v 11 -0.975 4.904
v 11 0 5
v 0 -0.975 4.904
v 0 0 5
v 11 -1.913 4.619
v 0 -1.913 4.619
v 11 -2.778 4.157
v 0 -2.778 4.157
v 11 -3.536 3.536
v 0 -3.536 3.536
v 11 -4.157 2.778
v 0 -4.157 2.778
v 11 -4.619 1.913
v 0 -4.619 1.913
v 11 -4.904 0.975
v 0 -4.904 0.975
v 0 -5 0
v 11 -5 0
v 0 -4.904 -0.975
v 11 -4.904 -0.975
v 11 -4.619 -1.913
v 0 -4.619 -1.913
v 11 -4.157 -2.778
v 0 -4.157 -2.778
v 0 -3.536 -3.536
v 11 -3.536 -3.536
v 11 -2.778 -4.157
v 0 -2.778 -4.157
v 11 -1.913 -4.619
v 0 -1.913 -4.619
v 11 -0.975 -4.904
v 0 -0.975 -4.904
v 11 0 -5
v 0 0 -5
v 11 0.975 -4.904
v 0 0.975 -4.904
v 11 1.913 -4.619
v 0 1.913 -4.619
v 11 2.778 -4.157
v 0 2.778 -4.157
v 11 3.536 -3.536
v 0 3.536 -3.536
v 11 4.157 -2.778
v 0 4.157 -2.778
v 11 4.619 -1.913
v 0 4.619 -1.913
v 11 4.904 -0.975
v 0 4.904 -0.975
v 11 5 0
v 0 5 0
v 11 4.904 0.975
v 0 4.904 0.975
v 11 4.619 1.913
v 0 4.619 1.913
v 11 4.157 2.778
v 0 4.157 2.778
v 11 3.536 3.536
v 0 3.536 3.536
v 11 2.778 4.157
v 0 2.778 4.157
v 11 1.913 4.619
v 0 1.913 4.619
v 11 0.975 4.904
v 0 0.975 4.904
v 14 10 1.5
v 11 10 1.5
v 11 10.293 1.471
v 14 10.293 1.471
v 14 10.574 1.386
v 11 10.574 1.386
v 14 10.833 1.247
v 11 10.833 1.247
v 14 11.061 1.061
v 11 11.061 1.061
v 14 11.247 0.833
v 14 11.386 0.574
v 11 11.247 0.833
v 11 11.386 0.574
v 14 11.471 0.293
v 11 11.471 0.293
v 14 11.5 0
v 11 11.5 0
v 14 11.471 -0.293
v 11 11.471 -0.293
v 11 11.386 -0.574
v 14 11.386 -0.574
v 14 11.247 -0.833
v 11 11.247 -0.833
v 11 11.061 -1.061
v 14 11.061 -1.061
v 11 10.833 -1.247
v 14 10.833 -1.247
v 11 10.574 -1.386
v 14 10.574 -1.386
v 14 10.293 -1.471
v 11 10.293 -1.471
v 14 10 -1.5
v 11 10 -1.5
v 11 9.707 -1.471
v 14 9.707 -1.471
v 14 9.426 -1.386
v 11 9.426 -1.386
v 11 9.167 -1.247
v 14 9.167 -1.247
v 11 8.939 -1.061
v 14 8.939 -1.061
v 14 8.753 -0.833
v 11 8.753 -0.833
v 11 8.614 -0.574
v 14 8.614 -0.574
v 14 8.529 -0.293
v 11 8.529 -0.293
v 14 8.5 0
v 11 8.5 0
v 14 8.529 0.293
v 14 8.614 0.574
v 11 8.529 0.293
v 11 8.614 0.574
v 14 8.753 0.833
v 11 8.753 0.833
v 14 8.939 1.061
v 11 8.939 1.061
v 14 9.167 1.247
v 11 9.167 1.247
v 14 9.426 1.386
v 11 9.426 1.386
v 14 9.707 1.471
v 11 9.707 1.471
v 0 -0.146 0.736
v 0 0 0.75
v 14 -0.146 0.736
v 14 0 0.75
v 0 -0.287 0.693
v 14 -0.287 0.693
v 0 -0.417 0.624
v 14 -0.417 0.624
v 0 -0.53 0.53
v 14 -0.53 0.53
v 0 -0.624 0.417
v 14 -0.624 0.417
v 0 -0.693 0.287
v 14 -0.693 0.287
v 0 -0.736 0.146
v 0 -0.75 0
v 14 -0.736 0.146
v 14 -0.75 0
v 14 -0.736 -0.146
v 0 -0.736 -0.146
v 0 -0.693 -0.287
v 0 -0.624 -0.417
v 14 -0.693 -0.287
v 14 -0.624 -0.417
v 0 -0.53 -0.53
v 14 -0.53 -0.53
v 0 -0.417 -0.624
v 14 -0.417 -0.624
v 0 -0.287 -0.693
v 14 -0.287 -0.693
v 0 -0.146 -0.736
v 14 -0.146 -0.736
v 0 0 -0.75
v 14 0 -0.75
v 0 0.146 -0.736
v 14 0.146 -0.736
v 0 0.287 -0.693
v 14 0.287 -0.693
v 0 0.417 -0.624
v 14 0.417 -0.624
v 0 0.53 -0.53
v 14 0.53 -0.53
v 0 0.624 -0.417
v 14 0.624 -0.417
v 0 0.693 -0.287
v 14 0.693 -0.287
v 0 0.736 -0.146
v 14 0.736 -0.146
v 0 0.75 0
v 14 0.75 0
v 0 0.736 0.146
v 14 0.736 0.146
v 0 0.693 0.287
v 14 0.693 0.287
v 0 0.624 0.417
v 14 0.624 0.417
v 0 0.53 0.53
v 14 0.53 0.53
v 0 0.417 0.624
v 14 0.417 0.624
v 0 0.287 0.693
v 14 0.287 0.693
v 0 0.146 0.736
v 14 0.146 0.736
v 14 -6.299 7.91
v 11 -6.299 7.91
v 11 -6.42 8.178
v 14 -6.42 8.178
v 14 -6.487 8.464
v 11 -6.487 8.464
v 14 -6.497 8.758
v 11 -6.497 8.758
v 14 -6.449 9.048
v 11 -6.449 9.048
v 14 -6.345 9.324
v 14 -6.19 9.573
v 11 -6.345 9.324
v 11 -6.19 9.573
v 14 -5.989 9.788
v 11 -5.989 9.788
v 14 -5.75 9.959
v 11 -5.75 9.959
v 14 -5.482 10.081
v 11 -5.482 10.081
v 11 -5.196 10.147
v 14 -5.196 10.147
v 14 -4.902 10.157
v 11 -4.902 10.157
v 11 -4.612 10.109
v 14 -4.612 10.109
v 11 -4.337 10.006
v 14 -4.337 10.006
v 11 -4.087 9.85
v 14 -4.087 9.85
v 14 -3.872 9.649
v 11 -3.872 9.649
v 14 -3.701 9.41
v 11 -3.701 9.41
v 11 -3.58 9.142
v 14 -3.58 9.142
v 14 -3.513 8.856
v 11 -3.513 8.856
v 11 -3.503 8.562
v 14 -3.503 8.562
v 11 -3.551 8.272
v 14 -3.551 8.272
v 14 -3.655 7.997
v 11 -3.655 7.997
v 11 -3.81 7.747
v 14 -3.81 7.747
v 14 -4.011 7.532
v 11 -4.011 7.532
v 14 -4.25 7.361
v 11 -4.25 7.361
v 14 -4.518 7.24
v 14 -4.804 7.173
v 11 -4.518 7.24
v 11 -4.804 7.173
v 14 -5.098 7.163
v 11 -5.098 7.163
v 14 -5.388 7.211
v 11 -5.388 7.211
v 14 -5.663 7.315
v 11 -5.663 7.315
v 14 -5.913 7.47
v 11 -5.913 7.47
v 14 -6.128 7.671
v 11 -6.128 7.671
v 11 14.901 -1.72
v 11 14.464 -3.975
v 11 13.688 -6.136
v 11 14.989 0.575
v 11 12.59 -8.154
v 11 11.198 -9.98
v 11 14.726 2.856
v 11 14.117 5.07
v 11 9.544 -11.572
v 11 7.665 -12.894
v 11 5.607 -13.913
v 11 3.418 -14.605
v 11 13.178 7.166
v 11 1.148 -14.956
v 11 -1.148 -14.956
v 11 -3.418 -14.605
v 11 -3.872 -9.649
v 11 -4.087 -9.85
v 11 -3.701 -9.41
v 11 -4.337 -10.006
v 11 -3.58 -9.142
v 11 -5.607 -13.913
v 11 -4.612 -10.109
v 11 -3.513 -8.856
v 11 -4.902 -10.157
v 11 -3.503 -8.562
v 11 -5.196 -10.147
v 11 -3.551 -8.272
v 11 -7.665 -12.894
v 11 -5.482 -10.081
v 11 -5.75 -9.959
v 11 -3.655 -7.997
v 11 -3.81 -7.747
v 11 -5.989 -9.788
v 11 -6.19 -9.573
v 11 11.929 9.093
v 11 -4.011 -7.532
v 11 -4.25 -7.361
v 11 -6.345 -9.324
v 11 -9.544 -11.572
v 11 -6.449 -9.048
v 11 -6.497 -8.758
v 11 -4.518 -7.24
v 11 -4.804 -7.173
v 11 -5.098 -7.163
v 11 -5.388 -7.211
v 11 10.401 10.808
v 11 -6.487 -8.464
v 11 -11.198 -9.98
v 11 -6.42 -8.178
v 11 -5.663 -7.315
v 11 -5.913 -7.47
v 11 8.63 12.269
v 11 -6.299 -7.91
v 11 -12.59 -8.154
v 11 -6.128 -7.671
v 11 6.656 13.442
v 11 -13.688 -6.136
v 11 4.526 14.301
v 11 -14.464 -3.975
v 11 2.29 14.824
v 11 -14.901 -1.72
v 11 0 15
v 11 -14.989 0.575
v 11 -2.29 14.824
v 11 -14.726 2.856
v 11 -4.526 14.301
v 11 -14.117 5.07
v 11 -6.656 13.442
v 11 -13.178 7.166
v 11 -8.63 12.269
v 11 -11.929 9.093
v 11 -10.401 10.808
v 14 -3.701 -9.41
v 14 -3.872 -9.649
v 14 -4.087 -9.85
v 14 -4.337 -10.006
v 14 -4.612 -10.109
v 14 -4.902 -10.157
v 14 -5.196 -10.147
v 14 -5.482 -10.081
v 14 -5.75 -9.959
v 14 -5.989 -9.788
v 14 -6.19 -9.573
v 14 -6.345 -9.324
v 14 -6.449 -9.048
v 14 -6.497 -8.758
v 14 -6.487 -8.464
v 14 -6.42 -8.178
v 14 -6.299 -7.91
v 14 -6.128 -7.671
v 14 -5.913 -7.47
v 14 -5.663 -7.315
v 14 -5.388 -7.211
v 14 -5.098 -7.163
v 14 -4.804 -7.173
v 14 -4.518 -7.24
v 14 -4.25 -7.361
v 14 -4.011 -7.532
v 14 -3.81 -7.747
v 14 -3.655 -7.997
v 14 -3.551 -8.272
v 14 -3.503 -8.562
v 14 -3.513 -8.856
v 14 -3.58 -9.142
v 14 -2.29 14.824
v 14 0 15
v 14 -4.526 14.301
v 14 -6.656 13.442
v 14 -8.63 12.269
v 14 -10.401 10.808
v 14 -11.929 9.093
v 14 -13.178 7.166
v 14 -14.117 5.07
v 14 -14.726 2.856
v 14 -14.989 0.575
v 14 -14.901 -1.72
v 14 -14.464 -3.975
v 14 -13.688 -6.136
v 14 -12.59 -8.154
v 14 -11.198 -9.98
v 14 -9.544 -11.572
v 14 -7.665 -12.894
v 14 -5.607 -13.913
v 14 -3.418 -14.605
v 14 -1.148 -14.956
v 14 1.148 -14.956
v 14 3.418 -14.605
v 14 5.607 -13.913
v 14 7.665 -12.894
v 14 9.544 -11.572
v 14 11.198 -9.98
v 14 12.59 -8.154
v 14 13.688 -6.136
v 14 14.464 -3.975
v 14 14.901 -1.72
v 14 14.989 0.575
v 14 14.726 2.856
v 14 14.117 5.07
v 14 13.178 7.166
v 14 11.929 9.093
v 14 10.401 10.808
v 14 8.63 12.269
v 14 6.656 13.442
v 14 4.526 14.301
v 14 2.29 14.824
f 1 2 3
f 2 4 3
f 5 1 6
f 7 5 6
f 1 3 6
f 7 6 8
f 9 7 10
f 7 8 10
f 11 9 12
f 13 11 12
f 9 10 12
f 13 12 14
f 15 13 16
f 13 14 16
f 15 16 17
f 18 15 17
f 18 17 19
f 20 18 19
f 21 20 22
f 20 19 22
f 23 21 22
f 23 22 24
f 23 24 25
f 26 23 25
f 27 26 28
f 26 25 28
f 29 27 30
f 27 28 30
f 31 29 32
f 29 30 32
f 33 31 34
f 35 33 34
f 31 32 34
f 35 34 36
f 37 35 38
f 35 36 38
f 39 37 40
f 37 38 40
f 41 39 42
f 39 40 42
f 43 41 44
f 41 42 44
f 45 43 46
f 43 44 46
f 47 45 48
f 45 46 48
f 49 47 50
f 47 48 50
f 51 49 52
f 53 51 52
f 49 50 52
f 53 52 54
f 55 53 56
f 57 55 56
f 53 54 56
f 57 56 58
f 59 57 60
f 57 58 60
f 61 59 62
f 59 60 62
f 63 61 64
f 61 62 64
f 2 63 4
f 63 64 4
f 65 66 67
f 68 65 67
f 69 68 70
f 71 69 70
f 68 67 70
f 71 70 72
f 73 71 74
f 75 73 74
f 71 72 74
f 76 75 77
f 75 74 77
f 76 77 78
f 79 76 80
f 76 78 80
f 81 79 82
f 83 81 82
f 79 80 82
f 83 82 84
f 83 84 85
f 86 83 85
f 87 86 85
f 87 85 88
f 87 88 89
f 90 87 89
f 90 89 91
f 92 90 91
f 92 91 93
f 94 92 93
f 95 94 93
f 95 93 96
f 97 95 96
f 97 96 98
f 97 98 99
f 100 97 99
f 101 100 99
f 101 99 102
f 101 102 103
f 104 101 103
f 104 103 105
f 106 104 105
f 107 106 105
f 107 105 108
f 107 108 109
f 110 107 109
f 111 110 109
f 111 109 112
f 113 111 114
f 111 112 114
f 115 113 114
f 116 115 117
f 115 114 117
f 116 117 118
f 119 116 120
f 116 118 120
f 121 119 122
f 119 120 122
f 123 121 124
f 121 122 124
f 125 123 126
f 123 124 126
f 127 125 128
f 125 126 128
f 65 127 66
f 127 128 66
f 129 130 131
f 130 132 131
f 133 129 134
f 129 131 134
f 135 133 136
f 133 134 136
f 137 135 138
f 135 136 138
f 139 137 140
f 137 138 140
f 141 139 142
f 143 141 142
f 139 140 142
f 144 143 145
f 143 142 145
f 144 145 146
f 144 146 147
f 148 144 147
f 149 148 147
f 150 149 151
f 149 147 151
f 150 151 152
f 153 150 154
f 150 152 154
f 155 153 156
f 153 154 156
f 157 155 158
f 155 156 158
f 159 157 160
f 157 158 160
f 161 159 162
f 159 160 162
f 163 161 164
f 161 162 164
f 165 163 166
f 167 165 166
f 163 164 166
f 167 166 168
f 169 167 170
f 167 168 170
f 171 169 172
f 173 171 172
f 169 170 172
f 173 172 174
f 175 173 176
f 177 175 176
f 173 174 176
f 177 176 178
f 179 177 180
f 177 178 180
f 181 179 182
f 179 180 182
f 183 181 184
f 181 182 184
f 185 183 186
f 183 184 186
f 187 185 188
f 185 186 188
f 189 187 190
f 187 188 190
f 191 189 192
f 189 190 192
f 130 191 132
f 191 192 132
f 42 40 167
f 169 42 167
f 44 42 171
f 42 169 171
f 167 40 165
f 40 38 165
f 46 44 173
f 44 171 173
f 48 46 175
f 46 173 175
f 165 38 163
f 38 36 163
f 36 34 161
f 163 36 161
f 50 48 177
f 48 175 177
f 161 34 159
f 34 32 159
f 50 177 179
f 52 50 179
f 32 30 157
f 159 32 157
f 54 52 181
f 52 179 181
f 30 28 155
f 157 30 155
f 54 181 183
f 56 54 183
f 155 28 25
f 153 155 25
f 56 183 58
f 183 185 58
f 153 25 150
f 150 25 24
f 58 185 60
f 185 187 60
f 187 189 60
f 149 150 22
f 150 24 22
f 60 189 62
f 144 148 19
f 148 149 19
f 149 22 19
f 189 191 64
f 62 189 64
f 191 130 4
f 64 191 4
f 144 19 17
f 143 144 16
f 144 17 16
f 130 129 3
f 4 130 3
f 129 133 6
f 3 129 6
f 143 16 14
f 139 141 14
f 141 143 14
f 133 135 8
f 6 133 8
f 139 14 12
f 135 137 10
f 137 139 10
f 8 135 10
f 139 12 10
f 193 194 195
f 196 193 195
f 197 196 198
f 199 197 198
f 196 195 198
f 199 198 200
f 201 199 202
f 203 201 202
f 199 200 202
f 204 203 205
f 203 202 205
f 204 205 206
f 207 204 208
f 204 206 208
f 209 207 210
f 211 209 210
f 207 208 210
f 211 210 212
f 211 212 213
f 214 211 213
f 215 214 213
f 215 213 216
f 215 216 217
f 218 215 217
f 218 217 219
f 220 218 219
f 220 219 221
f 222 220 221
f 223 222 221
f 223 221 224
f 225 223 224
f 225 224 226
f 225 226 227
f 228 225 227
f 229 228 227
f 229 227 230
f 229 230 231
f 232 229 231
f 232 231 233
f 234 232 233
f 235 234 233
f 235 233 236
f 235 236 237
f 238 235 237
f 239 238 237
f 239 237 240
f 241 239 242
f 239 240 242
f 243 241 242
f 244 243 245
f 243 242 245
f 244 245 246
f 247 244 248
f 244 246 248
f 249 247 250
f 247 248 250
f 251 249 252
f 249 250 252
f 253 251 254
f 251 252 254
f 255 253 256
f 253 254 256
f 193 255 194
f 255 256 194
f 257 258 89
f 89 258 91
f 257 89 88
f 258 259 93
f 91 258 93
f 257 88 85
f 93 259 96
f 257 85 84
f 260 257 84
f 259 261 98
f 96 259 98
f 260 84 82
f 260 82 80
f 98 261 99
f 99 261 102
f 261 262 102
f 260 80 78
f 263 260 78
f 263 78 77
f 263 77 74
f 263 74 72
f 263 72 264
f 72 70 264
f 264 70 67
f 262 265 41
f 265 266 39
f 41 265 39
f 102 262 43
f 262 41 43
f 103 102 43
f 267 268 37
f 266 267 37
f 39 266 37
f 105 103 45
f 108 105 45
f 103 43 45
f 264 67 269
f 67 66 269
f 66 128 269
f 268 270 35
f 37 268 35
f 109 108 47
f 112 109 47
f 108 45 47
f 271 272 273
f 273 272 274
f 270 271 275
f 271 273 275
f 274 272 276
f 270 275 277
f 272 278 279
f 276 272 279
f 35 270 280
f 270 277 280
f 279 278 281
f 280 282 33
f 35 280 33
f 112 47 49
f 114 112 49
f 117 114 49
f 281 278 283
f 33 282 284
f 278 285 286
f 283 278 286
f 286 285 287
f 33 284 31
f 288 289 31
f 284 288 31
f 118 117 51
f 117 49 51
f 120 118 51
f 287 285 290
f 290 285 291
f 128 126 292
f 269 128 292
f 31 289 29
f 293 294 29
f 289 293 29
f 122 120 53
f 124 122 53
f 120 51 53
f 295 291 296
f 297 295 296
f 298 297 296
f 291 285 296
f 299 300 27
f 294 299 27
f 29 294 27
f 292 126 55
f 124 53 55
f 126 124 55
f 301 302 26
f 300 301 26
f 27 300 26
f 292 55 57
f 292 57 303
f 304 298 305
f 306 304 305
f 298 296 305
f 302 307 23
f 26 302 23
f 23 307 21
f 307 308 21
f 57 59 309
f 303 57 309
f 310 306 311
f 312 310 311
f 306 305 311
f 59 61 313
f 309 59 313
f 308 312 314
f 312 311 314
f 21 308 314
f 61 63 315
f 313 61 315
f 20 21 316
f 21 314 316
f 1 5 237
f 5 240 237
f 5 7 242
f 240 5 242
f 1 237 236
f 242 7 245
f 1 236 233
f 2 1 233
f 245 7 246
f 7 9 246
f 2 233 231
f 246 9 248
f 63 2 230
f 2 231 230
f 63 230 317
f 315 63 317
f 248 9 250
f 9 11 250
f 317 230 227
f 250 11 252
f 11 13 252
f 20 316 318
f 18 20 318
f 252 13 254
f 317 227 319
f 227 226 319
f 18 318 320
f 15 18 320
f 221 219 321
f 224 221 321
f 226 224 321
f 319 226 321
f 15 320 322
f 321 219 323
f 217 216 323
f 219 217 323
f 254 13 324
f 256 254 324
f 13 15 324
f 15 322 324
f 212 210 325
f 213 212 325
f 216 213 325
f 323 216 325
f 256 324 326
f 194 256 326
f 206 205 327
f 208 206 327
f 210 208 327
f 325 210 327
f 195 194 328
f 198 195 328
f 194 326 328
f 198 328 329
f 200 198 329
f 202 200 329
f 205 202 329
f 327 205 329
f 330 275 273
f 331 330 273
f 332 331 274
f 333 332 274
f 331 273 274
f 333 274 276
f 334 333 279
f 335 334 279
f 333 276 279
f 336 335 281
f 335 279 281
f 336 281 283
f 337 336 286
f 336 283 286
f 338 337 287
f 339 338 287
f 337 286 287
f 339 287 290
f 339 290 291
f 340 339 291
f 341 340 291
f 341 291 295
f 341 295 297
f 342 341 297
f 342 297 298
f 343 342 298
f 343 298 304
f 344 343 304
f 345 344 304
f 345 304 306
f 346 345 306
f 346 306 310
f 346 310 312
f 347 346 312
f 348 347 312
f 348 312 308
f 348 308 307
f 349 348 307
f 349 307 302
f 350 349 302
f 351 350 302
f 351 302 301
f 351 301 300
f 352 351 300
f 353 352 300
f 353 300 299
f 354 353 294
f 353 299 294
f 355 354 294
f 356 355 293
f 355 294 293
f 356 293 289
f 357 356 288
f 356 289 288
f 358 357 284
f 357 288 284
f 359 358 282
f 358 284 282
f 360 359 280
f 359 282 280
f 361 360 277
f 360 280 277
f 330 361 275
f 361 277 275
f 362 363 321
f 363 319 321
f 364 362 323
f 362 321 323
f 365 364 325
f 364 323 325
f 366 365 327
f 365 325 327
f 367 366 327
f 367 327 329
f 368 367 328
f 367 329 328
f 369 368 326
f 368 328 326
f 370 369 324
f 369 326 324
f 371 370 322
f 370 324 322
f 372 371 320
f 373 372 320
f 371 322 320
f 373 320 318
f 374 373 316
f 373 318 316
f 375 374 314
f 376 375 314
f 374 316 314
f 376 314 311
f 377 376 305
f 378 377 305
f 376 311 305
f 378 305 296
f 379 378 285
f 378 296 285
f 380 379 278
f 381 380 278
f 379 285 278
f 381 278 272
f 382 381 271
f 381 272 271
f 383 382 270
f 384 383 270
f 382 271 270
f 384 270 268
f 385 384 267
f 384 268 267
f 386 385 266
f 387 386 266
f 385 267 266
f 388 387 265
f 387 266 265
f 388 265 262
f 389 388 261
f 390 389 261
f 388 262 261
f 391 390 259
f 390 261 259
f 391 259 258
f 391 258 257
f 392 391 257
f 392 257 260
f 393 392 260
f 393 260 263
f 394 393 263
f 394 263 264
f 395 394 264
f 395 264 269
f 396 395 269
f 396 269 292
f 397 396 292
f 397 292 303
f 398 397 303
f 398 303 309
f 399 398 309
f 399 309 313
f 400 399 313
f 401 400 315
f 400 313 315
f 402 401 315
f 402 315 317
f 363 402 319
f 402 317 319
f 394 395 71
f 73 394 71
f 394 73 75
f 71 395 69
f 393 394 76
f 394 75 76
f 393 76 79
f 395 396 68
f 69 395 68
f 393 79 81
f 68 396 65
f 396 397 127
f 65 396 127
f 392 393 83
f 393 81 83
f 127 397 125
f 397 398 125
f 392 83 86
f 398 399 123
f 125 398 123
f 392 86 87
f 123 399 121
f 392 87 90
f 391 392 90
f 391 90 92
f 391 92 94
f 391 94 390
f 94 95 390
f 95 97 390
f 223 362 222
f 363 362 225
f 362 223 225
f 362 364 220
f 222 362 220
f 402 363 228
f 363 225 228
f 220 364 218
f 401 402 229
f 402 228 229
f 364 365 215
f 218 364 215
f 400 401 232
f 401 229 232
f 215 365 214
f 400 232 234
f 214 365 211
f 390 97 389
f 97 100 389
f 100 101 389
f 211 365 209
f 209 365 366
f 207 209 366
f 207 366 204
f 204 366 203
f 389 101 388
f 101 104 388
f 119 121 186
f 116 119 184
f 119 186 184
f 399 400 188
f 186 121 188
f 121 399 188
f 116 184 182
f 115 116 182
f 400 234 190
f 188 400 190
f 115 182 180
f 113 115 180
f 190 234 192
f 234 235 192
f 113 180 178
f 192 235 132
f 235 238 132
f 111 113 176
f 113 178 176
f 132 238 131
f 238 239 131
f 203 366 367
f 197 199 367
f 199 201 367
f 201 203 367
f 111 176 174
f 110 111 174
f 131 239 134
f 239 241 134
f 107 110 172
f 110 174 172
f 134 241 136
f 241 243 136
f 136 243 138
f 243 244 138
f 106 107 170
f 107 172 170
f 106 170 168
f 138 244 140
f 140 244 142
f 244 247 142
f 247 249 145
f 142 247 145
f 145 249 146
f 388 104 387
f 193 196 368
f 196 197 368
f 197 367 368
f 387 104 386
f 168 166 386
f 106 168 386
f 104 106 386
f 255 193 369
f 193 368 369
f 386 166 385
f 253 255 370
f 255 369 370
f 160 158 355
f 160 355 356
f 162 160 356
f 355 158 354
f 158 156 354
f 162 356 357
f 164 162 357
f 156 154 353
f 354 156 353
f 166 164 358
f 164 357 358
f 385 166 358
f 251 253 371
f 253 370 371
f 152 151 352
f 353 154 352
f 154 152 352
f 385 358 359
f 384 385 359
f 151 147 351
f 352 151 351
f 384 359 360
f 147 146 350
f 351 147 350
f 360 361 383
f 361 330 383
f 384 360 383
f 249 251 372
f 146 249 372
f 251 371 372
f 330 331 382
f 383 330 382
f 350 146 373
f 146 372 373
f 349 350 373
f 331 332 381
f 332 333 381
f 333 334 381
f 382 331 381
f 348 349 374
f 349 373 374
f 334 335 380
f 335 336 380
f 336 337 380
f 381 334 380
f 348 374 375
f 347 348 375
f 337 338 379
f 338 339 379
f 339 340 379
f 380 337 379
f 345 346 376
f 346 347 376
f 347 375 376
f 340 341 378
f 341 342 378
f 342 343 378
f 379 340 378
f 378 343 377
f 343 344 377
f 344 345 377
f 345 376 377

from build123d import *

# Parameters (mm, degrees)
SKETCH3_R          = 1.5
CUT_EXTRUDE1_DEPTH = 10
CIRPATTERN1_COUNT  = 3


with BuildPart() as part:
    # Sketch2 → Revolve1 (revolve)
    with BuildSketch(Plane.XY, mode=Mode.PRIVATE) as revolve1_sk:
        Polygon((14, 15), (11, 15), (11, 5), (0, 5), (0, 0.75), (14, 0.75), align=None)
    revolve(revolve1_sk.sketch.rotate(Axis((0, 0, 0), (1, 0, 0)), 90), axis=Axis((0, 0, 0), (1, 0, 0)))

    # Sketch3 → Cut-Extrude1 (cut)
    with BuildSketch(Plane.ZY.offset(-11)):
        with Locations((0, 10)):
            Circle(SKETCH3_R)
    cut_extrude1 = extrude(amount=-CUT_EXTRUDE1_DEPTH, mode=Mode.SUBTRACT)

    # CirPattern1: Cut-Extrude1 ×3 about axis
    cirpattern1_axis = Axis((0, 0, 0), (1, 0, 0))
    for i in range(1, CIRPATTERN1_COUNT):
        add(cut_extrude1.rotate(cirpattern1_axis, i * 360 / CIRPATTERN1_COUNT), mode=Mode.SUBTRACT)


solid = part.part
